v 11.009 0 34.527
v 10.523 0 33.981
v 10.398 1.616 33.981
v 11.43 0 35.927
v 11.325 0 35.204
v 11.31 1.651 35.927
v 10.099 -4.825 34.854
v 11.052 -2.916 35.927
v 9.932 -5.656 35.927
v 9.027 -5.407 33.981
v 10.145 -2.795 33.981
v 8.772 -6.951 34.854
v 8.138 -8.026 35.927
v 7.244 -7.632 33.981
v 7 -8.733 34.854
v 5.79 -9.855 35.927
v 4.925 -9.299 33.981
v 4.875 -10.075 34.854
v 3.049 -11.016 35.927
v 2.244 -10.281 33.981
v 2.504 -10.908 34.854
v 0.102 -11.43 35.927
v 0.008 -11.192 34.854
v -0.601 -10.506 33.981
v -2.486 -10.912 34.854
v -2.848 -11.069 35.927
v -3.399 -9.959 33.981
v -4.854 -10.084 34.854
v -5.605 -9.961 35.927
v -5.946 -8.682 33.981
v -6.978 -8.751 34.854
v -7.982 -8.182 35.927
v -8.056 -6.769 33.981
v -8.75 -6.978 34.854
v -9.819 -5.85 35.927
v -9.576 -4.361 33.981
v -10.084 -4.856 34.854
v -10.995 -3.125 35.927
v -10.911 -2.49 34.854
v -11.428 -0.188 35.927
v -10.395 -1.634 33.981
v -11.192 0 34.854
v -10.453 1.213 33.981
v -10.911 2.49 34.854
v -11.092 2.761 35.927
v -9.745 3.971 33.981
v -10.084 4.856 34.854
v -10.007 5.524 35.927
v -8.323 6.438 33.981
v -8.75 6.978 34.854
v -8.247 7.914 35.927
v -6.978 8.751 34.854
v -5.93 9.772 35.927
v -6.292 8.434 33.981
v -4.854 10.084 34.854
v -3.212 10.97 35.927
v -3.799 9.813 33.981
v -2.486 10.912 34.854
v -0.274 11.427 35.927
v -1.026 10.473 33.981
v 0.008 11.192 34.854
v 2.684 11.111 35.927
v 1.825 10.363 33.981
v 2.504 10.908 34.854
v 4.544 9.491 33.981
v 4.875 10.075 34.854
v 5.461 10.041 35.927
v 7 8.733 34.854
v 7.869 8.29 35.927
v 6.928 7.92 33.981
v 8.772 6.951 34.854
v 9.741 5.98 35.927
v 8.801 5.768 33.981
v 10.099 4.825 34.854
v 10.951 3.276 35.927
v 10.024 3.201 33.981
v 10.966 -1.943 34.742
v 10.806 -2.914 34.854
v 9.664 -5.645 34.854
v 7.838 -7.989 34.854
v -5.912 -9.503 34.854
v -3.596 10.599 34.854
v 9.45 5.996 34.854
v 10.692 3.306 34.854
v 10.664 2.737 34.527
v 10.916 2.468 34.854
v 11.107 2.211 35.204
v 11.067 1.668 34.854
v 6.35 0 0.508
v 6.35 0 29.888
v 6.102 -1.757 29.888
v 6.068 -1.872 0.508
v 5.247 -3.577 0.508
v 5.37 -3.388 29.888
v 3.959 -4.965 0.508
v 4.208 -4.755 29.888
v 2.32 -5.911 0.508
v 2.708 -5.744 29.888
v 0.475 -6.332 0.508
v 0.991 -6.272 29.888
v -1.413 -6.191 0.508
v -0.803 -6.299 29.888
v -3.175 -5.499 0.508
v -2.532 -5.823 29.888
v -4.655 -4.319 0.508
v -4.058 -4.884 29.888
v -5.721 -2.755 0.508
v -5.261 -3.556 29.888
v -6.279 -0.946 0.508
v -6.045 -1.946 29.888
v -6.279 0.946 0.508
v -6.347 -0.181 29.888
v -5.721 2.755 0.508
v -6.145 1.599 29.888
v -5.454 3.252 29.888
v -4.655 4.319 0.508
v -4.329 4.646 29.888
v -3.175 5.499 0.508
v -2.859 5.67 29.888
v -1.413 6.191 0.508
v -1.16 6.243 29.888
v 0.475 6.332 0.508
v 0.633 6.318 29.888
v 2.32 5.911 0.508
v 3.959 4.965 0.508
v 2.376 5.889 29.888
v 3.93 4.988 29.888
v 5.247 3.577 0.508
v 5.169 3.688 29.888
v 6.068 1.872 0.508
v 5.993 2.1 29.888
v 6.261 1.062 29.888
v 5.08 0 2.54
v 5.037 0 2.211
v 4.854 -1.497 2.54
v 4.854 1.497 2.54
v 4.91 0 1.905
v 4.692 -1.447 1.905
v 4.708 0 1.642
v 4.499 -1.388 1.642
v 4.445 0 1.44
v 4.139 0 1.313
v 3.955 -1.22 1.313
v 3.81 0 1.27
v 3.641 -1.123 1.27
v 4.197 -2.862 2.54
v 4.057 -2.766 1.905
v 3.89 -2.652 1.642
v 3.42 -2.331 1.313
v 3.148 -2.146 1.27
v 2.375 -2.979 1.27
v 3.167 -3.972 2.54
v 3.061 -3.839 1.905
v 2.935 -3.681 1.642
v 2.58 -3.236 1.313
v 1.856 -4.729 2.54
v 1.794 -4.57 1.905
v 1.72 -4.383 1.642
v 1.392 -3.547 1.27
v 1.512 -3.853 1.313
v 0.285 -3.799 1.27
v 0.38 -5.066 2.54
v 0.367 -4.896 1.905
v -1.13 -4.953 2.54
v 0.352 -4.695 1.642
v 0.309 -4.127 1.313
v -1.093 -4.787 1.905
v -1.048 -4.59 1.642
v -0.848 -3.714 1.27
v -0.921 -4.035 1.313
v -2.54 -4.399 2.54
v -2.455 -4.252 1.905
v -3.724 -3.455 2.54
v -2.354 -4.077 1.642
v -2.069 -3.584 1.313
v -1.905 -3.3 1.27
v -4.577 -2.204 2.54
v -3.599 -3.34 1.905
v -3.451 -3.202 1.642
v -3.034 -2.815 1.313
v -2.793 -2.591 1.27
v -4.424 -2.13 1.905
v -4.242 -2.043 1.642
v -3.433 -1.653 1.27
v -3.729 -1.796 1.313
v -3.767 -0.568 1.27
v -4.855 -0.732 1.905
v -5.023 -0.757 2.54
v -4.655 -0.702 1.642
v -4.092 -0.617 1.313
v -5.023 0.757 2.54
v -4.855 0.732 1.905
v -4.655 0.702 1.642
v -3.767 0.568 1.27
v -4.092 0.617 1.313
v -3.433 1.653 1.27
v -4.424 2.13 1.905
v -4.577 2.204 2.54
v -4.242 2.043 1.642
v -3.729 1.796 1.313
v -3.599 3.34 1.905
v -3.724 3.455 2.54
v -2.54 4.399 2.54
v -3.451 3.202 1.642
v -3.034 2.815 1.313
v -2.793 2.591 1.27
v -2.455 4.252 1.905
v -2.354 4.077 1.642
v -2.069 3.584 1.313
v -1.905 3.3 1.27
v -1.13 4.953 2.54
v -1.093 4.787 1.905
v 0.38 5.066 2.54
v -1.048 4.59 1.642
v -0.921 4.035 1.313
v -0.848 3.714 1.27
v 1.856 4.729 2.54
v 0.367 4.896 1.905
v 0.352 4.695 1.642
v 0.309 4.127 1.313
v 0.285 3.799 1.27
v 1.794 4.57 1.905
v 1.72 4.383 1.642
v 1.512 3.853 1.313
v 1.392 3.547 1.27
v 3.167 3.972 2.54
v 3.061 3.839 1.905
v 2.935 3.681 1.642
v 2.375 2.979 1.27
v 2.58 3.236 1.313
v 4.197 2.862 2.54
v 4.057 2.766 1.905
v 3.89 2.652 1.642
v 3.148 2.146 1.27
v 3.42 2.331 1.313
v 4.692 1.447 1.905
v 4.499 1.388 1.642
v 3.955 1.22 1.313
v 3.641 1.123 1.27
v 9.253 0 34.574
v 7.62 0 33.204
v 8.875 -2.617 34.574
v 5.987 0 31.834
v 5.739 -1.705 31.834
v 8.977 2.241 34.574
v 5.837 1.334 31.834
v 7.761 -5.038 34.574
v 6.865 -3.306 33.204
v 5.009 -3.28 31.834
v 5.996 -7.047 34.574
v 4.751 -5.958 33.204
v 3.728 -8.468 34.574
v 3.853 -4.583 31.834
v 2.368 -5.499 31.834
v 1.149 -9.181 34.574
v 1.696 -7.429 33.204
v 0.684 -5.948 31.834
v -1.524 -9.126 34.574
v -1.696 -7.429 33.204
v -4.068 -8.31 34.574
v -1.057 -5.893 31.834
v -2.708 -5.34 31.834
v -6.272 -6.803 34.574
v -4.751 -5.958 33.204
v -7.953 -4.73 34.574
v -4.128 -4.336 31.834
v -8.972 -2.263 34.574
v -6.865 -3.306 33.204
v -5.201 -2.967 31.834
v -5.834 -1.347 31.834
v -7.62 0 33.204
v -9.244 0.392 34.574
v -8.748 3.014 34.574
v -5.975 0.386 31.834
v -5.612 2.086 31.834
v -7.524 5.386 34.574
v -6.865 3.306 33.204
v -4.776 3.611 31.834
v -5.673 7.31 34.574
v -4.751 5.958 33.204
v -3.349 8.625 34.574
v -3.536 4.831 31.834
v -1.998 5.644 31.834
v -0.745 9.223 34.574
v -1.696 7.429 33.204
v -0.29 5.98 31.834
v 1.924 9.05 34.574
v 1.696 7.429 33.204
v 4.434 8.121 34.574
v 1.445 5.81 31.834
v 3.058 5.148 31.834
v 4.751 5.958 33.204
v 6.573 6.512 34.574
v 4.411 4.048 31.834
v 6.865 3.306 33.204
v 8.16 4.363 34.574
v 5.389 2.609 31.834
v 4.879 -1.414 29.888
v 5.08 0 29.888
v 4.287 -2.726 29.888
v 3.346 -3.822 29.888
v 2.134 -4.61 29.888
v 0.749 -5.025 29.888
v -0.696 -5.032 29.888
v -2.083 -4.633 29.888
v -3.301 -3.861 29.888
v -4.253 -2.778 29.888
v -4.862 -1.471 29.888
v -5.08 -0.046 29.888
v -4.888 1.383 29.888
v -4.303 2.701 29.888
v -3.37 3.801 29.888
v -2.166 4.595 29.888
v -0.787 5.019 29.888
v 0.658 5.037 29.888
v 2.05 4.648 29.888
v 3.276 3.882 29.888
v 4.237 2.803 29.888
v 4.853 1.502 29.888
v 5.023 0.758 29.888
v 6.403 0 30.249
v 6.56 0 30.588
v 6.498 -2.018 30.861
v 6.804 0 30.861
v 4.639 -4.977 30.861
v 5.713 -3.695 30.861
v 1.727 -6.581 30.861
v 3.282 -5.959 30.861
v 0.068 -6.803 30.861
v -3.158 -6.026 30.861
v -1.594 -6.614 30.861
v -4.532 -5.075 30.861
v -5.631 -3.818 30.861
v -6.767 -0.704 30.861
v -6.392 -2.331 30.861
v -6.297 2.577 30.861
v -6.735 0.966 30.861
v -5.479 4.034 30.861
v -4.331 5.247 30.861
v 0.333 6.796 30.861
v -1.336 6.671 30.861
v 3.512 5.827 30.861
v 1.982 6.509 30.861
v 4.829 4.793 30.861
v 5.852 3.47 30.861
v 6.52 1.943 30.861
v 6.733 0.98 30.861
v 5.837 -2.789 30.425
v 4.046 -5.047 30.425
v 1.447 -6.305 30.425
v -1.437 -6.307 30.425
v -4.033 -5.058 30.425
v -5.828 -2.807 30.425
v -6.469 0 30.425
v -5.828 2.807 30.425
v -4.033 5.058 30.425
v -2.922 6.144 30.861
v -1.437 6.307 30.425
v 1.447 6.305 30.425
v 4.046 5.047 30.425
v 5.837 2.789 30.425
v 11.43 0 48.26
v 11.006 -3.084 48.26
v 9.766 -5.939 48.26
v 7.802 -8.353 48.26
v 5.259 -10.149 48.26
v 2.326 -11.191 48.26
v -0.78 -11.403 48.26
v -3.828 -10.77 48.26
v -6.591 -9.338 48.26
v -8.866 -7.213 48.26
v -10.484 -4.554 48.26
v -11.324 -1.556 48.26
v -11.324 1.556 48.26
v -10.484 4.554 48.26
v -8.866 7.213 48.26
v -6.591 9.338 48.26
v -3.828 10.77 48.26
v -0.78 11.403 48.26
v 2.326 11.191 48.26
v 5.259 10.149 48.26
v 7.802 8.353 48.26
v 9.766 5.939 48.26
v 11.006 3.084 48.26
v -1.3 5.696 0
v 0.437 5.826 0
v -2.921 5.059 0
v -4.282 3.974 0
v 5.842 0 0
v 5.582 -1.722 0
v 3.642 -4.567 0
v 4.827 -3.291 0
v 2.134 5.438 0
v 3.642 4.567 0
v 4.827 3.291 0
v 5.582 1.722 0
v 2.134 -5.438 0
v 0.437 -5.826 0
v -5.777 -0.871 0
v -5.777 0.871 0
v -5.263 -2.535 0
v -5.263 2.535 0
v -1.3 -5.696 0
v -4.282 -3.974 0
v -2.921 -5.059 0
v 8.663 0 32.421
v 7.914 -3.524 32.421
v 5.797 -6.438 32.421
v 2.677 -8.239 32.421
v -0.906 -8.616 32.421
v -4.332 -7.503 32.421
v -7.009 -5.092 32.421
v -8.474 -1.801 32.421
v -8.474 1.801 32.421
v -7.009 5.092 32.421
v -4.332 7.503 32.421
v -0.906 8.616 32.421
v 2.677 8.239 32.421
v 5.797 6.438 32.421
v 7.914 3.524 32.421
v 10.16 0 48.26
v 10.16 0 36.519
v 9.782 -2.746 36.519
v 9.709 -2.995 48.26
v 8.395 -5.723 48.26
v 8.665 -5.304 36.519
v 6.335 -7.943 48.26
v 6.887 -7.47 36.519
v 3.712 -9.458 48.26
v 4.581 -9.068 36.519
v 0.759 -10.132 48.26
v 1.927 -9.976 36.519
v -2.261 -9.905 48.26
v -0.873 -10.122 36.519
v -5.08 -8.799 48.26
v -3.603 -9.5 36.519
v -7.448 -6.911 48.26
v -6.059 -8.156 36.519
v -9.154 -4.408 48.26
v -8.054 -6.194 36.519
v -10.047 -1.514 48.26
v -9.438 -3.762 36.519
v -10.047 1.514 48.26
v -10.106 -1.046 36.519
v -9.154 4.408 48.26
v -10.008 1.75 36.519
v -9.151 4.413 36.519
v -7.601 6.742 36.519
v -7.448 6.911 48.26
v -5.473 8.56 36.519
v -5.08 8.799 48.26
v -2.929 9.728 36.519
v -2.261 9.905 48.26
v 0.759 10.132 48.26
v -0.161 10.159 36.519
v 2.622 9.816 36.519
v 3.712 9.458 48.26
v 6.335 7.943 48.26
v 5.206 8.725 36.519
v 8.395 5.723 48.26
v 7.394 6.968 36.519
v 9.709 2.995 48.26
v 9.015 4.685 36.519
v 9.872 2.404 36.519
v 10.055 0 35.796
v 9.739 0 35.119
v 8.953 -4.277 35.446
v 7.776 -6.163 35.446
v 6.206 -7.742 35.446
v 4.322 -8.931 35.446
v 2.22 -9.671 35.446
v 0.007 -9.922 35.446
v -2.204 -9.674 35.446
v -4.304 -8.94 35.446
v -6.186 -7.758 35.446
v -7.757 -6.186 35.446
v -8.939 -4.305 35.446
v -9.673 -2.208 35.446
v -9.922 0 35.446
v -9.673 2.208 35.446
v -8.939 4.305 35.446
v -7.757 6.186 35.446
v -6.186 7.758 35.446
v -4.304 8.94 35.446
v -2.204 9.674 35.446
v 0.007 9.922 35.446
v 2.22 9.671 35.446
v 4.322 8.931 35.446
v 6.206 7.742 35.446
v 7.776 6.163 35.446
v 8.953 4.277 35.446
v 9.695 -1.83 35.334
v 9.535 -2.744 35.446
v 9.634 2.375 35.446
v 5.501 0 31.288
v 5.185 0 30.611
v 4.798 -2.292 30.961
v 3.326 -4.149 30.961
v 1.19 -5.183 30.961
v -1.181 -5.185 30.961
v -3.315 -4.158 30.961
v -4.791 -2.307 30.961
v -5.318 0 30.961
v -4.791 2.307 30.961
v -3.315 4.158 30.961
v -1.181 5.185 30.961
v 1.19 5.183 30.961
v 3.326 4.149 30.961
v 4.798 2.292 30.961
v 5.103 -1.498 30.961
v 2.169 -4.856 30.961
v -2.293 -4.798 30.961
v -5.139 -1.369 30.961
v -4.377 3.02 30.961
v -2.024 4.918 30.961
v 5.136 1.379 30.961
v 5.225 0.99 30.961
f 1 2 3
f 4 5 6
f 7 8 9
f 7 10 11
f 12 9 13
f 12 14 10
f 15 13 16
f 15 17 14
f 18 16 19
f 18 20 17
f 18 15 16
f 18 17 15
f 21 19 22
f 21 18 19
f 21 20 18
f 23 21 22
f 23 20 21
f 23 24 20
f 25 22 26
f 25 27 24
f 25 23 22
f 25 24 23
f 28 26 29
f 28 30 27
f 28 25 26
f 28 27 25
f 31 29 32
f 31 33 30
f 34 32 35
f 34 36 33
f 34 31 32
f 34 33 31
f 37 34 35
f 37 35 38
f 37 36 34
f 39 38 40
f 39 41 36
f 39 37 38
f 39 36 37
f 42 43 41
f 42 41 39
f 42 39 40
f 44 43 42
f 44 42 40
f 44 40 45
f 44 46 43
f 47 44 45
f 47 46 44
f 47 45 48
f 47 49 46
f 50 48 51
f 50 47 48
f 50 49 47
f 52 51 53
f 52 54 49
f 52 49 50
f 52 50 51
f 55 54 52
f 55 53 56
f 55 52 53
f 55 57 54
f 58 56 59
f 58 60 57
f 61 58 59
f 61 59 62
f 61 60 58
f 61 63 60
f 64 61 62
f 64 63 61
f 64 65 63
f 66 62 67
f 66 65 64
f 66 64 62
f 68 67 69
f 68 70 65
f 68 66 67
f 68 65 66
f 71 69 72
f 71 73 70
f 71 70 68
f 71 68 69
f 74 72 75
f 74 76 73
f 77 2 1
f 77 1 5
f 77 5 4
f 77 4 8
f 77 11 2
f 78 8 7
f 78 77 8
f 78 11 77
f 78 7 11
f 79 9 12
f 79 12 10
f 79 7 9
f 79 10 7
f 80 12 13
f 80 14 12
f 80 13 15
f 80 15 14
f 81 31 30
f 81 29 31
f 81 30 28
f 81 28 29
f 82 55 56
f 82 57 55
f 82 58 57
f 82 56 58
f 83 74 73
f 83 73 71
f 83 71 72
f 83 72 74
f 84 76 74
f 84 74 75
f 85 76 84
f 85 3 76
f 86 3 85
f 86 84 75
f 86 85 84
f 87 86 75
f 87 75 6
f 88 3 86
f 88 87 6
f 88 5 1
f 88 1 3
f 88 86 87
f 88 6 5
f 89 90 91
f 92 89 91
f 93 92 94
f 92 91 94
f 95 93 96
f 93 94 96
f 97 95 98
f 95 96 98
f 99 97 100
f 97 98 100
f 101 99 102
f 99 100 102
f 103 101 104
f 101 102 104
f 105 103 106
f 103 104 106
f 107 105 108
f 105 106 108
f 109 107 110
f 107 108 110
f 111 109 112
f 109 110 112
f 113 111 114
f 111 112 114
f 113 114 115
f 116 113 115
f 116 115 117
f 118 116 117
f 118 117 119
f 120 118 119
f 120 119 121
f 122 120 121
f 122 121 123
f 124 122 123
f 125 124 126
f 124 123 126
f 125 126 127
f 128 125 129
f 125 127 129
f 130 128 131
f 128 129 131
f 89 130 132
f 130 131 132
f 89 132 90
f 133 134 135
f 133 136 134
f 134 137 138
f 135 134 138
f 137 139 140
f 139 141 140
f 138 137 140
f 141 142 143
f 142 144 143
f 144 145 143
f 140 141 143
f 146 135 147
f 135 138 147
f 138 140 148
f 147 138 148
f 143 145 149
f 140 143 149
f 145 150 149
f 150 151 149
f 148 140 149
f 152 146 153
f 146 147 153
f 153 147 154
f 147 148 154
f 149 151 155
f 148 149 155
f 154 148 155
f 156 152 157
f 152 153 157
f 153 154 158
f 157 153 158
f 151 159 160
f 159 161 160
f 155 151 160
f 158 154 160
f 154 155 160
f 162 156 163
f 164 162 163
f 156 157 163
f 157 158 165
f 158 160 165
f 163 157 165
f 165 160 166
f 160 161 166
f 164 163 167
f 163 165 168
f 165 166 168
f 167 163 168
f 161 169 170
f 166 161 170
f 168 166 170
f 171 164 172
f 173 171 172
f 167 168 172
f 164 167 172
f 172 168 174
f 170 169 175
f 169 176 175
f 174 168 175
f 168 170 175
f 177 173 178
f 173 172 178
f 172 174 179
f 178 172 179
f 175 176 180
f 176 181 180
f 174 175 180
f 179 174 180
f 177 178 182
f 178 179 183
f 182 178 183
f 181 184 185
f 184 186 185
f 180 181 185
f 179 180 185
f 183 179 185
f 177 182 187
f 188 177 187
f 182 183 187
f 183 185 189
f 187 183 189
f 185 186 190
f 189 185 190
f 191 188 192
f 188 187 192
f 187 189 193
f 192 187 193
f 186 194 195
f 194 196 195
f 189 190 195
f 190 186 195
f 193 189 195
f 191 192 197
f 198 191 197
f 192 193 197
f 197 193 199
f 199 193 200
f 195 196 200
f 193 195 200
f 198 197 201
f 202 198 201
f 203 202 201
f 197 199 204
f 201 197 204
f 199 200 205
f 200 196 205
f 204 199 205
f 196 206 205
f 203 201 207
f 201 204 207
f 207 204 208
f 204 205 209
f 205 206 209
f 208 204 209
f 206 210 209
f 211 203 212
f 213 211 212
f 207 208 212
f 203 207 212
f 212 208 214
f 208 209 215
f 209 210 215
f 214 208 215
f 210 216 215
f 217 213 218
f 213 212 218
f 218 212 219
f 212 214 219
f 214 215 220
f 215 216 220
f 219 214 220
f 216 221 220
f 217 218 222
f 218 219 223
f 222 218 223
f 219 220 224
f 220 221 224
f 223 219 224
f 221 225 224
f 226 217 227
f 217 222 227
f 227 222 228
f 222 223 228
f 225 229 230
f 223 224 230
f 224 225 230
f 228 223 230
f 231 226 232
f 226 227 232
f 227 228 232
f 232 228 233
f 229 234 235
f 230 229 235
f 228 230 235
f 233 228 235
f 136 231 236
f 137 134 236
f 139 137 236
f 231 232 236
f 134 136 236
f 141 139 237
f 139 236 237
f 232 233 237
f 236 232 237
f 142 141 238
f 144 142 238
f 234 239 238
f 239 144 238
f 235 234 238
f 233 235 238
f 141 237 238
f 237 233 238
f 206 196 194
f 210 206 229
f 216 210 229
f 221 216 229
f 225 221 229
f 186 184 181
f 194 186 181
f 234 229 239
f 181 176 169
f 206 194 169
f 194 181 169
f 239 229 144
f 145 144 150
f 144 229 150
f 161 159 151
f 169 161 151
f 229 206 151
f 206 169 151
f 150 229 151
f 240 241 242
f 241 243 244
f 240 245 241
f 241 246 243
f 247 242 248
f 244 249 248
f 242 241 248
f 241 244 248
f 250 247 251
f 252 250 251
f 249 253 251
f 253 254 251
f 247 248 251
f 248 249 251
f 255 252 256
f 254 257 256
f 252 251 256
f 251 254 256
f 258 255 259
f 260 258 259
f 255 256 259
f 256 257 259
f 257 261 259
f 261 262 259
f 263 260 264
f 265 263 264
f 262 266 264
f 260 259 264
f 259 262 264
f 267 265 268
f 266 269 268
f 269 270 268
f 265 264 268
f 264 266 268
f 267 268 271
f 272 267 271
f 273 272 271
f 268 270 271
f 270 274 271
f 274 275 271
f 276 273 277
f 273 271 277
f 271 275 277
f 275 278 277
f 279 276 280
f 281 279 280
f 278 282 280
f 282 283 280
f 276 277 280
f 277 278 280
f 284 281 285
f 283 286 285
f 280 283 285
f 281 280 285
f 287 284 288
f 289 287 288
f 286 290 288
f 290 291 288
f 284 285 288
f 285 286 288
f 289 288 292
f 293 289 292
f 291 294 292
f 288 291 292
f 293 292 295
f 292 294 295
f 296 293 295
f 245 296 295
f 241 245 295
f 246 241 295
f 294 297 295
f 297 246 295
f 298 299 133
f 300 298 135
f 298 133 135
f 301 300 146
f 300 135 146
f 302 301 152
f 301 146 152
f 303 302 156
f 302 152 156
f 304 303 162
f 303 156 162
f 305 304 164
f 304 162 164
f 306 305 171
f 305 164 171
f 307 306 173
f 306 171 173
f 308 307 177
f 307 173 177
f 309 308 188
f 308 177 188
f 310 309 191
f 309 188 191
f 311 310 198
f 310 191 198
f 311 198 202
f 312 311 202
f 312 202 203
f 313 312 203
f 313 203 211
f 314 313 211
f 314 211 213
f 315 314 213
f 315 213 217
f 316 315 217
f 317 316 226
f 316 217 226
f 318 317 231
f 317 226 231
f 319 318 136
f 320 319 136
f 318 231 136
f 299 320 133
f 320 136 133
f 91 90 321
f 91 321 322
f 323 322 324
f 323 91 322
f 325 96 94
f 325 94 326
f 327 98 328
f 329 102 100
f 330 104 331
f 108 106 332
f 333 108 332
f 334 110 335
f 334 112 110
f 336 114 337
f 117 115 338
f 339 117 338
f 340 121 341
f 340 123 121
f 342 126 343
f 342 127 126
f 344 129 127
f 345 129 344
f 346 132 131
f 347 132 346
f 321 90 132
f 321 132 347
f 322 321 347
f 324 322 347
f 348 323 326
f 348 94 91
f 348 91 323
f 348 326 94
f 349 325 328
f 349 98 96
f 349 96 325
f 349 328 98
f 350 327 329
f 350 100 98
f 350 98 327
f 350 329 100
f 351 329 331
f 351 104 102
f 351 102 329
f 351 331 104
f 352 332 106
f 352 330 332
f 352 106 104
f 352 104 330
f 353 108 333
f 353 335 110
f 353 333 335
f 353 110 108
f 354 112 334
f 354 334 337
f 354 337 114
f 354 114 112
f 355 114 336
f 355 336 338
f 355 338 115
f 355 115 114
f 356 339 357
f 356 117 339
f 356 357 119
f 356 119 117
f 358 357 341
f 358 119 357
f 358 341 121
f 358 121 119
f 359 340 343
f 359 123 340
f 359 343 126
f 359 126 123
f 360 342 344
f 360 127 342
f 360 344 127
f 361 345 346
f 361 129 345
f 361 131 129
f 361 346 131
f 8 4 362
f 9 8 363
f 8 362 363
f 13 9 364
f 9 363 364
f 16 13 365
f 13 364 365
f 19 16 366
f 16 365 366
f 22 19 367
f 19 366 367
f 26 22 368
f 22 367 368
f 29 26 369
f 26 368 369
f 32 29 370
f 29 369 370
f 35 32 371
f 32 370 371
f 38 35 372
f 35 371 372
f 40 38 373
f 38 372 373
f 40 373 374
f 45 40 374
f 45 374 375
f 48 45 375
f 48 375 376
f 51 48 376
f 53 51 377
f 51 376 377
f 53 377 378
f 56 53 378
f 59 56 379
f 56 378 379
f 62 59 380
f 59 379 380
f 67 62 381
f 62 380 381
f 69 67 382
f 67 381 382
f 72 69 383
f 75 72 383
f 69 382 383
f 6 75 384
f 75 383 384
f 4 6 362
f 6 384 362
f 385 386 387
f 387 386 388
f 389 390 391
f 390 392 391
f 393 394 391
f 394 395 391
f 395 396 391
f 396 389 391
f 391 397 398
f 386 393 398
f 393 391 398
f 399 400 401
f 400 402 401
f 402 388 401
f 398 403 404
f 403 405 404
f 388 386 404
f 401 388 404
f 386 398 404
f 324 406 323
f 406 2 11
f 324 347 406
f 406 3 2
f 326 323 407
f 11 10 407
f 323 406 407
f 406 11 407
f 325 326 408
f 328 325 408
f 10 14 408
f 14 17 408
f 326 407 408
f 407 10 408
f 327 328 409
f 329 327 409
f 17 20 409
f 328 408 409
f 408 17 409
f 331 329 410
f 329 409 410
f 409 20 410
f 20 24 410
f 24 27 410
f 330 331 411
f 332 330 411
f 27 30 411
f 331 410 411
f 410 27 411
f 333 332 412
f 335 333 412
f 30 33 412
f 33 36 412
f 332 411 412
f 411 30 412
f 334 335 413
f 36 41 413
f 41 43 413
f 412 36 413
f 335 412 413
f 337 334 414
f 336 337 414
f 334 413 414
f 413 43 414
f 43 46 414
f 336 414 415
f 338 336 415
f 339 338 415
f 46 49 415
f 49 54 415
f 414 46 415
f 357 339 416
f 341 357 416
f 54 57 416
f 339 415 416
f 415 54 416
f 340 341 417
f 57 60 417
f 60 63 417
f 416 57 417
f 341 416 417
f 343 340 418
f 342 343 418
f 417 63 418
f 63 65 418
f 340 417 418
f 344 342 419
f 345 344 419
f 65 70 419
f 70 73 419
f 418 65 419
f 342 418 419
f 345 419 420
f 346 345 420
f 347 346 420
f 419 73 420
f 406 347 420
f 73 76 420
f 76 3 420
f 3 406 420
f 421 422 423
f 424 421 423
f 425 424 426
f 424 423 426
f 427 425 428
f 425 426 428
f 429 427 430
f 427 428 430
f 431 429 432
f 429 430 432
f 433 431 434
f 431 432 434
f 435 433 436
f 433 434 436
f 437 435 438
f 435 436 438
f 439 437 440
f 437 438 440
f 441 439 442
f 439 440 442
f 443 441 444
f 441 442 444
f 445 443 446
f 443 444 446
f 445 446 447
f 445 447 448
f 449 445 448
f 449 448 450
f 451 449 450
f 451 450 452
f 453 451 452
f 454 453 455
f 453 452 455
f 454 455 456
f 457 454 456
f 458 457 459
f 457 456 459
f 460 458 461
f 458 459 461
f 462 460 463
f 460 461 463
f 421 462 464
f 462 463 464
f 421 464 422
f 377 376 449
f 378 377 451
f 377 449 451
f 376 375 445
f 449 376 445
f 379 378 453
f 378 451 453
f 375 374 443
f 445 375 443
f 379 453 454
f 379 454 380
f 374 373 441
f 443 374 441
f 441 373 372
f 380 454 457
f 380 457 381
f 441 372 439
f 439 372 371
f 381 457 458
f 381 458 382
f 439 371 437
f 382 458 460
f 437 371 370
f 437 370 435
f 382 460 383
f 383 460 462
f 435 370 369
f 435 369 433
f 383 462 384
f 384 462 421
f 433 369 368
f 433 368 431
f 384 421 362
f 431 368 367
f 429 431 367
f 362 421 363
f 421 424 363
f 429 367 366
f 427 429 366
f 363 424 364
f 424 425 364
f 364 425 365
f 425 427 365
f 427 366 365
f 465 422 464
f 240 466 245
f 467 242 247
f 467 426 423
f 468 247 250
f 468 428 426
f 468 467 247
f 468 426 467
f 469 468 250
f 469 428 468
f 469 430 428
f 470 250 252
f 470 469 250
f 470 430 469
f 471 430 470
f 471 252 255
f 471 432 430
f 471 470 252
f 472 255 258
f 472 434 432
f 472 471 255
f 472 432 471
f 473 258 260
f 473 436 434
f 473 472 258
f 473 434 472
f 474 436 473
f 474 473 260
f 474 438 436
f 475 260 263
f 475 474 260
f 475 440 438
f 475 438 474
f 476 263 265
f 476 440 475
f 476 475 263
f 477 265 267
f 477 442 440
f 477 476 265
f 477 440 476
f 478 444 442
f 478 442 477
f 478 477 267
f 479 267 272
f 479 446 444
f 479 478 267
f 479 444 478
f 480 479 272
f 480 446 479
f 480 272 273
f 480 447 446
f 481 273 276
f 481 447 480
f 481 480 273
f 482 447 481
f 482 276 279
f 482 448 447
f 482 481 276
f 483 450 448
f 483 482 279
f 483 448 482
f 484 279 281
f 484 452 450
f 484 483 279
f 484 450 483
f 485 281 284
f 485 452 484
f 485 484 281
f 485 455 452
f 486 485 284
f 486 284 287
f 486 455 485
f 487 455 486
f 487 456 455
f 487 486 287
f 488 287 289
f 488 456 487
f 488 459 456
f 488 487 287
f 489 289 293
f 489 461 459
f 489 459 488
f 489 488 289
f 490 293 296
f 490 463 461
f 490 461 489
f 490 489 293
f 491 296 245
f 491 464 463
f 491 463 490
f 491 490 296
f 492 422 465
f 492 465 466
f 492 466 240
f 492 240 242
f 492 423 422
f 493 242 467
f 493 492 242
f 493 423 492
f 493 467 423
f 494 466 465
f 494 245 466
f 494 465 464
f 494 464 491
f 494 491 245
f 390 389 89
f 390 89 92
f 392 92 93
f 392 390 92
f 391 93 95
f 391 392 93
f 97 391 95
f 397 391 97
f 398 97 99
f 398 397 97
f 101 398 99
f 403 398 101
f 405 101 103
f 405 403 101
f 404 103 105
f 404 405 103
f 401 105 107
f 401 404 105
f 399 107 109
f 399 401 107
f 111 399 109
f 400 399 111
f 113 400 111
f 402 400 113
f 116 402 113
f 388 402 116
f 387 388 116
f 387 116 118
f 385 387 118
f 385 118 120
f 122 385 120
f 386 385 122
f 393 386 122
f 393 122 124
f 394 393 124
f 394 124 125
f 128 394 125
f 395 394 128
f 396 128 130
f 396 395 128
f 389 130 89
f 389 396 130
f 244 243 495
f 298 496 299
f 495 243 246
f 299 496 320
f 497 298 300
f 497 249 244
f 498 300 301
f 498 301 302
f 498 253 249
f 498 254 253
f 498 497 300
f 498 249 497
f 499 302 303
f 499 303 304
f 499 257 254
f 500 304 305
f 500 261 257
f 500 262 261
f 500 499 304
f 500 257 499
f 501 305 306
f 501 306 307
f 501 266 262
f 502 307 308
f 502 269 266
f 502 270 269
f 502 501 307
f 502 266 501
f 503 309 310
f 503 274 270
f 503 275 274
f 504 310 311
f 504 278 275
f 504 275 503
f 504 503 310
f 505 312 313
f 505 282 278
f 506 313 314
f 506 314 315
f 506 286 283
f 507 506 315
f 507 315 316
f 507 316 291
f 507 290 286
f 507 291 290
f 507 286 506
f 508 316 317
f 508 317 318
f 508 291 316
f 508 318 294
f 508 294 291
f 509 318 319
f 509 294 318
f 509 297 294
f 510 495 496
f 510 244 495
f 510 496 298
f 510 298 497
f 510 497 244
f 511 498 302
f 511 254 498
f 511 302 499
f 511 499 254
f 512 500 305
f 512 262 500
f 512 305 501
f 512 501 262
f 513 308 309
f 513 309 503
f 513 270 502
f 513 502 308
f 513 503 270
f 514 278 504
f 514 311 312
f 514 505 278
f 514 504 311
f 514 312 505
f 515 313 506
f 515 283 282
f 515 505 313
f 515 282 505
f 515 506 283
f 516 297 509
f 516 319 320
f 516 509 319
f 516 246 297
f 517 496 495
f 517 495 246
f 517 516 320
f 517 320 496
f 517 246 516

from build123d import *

# Parameters (mm, degrees)
F2_R    = 1.27
F3_SIZE = 0.508
F4_R    = 1.27
F5_R    = 2.54
F6_R    = 2.54


with BuildPart() as f1:
    # F0 (on Front) → F1 (revolve)
    with BuildSketch(Plane.XZ):
        Polygon((6.35, 0), (6.35, 30.48), (11.43, 34.742626), (11.43, 48.26), (10.16, 48.26), (10.16, 35.334837), (5.08, 31.072211), (5.08, 1.27), (0, 1.27), (0, 0), align=None)
    revolve(axis=Axis((0, 0, 19.968925), (0, 0, -1)))

    # F2
    f2_edges = [f1.edges().sort_by_distance(p)[0] for p in [
        (-5.08, 0, 1.27),
    ]]
    fillet(f2_edges, radius=F2_R)

    # F3
    f3_edges = [f1.edges().sort_by_distance(p)[0] for p in [
        (-6.35, 0, 0),
    ]]
    chamfer(f3_edges, length=F3_SIZE)

    # F4
    f4_edges = [f1.edges().sort_by_distance(p)[0] for p in [
        (-6.35, 0, 30.48),
    ]]
    fillet(f4_edges, radius=F4_R)

    # F5
    f5_edges = [f1.edges().sort_by_distance(p)[0] for p in [
        (-11.43, 0, 34.742626),
    ]]
    fillet(f5_edges, radius=F5_R)

    # F6
    f6_edges = [f1.edges().sort_by_distance(p)[0] for p in [
        (-10.16, 0, 35.334837),
        (-5.08, 0, 31.072211),
    ]]
    fillet(f6_edges, radius=F6_R)


with BuildPart() as f7_1:
    # F7: copy of F1
    add(f1.part.moved(Location((69.85, 0, 0))))


solid = f1.part
